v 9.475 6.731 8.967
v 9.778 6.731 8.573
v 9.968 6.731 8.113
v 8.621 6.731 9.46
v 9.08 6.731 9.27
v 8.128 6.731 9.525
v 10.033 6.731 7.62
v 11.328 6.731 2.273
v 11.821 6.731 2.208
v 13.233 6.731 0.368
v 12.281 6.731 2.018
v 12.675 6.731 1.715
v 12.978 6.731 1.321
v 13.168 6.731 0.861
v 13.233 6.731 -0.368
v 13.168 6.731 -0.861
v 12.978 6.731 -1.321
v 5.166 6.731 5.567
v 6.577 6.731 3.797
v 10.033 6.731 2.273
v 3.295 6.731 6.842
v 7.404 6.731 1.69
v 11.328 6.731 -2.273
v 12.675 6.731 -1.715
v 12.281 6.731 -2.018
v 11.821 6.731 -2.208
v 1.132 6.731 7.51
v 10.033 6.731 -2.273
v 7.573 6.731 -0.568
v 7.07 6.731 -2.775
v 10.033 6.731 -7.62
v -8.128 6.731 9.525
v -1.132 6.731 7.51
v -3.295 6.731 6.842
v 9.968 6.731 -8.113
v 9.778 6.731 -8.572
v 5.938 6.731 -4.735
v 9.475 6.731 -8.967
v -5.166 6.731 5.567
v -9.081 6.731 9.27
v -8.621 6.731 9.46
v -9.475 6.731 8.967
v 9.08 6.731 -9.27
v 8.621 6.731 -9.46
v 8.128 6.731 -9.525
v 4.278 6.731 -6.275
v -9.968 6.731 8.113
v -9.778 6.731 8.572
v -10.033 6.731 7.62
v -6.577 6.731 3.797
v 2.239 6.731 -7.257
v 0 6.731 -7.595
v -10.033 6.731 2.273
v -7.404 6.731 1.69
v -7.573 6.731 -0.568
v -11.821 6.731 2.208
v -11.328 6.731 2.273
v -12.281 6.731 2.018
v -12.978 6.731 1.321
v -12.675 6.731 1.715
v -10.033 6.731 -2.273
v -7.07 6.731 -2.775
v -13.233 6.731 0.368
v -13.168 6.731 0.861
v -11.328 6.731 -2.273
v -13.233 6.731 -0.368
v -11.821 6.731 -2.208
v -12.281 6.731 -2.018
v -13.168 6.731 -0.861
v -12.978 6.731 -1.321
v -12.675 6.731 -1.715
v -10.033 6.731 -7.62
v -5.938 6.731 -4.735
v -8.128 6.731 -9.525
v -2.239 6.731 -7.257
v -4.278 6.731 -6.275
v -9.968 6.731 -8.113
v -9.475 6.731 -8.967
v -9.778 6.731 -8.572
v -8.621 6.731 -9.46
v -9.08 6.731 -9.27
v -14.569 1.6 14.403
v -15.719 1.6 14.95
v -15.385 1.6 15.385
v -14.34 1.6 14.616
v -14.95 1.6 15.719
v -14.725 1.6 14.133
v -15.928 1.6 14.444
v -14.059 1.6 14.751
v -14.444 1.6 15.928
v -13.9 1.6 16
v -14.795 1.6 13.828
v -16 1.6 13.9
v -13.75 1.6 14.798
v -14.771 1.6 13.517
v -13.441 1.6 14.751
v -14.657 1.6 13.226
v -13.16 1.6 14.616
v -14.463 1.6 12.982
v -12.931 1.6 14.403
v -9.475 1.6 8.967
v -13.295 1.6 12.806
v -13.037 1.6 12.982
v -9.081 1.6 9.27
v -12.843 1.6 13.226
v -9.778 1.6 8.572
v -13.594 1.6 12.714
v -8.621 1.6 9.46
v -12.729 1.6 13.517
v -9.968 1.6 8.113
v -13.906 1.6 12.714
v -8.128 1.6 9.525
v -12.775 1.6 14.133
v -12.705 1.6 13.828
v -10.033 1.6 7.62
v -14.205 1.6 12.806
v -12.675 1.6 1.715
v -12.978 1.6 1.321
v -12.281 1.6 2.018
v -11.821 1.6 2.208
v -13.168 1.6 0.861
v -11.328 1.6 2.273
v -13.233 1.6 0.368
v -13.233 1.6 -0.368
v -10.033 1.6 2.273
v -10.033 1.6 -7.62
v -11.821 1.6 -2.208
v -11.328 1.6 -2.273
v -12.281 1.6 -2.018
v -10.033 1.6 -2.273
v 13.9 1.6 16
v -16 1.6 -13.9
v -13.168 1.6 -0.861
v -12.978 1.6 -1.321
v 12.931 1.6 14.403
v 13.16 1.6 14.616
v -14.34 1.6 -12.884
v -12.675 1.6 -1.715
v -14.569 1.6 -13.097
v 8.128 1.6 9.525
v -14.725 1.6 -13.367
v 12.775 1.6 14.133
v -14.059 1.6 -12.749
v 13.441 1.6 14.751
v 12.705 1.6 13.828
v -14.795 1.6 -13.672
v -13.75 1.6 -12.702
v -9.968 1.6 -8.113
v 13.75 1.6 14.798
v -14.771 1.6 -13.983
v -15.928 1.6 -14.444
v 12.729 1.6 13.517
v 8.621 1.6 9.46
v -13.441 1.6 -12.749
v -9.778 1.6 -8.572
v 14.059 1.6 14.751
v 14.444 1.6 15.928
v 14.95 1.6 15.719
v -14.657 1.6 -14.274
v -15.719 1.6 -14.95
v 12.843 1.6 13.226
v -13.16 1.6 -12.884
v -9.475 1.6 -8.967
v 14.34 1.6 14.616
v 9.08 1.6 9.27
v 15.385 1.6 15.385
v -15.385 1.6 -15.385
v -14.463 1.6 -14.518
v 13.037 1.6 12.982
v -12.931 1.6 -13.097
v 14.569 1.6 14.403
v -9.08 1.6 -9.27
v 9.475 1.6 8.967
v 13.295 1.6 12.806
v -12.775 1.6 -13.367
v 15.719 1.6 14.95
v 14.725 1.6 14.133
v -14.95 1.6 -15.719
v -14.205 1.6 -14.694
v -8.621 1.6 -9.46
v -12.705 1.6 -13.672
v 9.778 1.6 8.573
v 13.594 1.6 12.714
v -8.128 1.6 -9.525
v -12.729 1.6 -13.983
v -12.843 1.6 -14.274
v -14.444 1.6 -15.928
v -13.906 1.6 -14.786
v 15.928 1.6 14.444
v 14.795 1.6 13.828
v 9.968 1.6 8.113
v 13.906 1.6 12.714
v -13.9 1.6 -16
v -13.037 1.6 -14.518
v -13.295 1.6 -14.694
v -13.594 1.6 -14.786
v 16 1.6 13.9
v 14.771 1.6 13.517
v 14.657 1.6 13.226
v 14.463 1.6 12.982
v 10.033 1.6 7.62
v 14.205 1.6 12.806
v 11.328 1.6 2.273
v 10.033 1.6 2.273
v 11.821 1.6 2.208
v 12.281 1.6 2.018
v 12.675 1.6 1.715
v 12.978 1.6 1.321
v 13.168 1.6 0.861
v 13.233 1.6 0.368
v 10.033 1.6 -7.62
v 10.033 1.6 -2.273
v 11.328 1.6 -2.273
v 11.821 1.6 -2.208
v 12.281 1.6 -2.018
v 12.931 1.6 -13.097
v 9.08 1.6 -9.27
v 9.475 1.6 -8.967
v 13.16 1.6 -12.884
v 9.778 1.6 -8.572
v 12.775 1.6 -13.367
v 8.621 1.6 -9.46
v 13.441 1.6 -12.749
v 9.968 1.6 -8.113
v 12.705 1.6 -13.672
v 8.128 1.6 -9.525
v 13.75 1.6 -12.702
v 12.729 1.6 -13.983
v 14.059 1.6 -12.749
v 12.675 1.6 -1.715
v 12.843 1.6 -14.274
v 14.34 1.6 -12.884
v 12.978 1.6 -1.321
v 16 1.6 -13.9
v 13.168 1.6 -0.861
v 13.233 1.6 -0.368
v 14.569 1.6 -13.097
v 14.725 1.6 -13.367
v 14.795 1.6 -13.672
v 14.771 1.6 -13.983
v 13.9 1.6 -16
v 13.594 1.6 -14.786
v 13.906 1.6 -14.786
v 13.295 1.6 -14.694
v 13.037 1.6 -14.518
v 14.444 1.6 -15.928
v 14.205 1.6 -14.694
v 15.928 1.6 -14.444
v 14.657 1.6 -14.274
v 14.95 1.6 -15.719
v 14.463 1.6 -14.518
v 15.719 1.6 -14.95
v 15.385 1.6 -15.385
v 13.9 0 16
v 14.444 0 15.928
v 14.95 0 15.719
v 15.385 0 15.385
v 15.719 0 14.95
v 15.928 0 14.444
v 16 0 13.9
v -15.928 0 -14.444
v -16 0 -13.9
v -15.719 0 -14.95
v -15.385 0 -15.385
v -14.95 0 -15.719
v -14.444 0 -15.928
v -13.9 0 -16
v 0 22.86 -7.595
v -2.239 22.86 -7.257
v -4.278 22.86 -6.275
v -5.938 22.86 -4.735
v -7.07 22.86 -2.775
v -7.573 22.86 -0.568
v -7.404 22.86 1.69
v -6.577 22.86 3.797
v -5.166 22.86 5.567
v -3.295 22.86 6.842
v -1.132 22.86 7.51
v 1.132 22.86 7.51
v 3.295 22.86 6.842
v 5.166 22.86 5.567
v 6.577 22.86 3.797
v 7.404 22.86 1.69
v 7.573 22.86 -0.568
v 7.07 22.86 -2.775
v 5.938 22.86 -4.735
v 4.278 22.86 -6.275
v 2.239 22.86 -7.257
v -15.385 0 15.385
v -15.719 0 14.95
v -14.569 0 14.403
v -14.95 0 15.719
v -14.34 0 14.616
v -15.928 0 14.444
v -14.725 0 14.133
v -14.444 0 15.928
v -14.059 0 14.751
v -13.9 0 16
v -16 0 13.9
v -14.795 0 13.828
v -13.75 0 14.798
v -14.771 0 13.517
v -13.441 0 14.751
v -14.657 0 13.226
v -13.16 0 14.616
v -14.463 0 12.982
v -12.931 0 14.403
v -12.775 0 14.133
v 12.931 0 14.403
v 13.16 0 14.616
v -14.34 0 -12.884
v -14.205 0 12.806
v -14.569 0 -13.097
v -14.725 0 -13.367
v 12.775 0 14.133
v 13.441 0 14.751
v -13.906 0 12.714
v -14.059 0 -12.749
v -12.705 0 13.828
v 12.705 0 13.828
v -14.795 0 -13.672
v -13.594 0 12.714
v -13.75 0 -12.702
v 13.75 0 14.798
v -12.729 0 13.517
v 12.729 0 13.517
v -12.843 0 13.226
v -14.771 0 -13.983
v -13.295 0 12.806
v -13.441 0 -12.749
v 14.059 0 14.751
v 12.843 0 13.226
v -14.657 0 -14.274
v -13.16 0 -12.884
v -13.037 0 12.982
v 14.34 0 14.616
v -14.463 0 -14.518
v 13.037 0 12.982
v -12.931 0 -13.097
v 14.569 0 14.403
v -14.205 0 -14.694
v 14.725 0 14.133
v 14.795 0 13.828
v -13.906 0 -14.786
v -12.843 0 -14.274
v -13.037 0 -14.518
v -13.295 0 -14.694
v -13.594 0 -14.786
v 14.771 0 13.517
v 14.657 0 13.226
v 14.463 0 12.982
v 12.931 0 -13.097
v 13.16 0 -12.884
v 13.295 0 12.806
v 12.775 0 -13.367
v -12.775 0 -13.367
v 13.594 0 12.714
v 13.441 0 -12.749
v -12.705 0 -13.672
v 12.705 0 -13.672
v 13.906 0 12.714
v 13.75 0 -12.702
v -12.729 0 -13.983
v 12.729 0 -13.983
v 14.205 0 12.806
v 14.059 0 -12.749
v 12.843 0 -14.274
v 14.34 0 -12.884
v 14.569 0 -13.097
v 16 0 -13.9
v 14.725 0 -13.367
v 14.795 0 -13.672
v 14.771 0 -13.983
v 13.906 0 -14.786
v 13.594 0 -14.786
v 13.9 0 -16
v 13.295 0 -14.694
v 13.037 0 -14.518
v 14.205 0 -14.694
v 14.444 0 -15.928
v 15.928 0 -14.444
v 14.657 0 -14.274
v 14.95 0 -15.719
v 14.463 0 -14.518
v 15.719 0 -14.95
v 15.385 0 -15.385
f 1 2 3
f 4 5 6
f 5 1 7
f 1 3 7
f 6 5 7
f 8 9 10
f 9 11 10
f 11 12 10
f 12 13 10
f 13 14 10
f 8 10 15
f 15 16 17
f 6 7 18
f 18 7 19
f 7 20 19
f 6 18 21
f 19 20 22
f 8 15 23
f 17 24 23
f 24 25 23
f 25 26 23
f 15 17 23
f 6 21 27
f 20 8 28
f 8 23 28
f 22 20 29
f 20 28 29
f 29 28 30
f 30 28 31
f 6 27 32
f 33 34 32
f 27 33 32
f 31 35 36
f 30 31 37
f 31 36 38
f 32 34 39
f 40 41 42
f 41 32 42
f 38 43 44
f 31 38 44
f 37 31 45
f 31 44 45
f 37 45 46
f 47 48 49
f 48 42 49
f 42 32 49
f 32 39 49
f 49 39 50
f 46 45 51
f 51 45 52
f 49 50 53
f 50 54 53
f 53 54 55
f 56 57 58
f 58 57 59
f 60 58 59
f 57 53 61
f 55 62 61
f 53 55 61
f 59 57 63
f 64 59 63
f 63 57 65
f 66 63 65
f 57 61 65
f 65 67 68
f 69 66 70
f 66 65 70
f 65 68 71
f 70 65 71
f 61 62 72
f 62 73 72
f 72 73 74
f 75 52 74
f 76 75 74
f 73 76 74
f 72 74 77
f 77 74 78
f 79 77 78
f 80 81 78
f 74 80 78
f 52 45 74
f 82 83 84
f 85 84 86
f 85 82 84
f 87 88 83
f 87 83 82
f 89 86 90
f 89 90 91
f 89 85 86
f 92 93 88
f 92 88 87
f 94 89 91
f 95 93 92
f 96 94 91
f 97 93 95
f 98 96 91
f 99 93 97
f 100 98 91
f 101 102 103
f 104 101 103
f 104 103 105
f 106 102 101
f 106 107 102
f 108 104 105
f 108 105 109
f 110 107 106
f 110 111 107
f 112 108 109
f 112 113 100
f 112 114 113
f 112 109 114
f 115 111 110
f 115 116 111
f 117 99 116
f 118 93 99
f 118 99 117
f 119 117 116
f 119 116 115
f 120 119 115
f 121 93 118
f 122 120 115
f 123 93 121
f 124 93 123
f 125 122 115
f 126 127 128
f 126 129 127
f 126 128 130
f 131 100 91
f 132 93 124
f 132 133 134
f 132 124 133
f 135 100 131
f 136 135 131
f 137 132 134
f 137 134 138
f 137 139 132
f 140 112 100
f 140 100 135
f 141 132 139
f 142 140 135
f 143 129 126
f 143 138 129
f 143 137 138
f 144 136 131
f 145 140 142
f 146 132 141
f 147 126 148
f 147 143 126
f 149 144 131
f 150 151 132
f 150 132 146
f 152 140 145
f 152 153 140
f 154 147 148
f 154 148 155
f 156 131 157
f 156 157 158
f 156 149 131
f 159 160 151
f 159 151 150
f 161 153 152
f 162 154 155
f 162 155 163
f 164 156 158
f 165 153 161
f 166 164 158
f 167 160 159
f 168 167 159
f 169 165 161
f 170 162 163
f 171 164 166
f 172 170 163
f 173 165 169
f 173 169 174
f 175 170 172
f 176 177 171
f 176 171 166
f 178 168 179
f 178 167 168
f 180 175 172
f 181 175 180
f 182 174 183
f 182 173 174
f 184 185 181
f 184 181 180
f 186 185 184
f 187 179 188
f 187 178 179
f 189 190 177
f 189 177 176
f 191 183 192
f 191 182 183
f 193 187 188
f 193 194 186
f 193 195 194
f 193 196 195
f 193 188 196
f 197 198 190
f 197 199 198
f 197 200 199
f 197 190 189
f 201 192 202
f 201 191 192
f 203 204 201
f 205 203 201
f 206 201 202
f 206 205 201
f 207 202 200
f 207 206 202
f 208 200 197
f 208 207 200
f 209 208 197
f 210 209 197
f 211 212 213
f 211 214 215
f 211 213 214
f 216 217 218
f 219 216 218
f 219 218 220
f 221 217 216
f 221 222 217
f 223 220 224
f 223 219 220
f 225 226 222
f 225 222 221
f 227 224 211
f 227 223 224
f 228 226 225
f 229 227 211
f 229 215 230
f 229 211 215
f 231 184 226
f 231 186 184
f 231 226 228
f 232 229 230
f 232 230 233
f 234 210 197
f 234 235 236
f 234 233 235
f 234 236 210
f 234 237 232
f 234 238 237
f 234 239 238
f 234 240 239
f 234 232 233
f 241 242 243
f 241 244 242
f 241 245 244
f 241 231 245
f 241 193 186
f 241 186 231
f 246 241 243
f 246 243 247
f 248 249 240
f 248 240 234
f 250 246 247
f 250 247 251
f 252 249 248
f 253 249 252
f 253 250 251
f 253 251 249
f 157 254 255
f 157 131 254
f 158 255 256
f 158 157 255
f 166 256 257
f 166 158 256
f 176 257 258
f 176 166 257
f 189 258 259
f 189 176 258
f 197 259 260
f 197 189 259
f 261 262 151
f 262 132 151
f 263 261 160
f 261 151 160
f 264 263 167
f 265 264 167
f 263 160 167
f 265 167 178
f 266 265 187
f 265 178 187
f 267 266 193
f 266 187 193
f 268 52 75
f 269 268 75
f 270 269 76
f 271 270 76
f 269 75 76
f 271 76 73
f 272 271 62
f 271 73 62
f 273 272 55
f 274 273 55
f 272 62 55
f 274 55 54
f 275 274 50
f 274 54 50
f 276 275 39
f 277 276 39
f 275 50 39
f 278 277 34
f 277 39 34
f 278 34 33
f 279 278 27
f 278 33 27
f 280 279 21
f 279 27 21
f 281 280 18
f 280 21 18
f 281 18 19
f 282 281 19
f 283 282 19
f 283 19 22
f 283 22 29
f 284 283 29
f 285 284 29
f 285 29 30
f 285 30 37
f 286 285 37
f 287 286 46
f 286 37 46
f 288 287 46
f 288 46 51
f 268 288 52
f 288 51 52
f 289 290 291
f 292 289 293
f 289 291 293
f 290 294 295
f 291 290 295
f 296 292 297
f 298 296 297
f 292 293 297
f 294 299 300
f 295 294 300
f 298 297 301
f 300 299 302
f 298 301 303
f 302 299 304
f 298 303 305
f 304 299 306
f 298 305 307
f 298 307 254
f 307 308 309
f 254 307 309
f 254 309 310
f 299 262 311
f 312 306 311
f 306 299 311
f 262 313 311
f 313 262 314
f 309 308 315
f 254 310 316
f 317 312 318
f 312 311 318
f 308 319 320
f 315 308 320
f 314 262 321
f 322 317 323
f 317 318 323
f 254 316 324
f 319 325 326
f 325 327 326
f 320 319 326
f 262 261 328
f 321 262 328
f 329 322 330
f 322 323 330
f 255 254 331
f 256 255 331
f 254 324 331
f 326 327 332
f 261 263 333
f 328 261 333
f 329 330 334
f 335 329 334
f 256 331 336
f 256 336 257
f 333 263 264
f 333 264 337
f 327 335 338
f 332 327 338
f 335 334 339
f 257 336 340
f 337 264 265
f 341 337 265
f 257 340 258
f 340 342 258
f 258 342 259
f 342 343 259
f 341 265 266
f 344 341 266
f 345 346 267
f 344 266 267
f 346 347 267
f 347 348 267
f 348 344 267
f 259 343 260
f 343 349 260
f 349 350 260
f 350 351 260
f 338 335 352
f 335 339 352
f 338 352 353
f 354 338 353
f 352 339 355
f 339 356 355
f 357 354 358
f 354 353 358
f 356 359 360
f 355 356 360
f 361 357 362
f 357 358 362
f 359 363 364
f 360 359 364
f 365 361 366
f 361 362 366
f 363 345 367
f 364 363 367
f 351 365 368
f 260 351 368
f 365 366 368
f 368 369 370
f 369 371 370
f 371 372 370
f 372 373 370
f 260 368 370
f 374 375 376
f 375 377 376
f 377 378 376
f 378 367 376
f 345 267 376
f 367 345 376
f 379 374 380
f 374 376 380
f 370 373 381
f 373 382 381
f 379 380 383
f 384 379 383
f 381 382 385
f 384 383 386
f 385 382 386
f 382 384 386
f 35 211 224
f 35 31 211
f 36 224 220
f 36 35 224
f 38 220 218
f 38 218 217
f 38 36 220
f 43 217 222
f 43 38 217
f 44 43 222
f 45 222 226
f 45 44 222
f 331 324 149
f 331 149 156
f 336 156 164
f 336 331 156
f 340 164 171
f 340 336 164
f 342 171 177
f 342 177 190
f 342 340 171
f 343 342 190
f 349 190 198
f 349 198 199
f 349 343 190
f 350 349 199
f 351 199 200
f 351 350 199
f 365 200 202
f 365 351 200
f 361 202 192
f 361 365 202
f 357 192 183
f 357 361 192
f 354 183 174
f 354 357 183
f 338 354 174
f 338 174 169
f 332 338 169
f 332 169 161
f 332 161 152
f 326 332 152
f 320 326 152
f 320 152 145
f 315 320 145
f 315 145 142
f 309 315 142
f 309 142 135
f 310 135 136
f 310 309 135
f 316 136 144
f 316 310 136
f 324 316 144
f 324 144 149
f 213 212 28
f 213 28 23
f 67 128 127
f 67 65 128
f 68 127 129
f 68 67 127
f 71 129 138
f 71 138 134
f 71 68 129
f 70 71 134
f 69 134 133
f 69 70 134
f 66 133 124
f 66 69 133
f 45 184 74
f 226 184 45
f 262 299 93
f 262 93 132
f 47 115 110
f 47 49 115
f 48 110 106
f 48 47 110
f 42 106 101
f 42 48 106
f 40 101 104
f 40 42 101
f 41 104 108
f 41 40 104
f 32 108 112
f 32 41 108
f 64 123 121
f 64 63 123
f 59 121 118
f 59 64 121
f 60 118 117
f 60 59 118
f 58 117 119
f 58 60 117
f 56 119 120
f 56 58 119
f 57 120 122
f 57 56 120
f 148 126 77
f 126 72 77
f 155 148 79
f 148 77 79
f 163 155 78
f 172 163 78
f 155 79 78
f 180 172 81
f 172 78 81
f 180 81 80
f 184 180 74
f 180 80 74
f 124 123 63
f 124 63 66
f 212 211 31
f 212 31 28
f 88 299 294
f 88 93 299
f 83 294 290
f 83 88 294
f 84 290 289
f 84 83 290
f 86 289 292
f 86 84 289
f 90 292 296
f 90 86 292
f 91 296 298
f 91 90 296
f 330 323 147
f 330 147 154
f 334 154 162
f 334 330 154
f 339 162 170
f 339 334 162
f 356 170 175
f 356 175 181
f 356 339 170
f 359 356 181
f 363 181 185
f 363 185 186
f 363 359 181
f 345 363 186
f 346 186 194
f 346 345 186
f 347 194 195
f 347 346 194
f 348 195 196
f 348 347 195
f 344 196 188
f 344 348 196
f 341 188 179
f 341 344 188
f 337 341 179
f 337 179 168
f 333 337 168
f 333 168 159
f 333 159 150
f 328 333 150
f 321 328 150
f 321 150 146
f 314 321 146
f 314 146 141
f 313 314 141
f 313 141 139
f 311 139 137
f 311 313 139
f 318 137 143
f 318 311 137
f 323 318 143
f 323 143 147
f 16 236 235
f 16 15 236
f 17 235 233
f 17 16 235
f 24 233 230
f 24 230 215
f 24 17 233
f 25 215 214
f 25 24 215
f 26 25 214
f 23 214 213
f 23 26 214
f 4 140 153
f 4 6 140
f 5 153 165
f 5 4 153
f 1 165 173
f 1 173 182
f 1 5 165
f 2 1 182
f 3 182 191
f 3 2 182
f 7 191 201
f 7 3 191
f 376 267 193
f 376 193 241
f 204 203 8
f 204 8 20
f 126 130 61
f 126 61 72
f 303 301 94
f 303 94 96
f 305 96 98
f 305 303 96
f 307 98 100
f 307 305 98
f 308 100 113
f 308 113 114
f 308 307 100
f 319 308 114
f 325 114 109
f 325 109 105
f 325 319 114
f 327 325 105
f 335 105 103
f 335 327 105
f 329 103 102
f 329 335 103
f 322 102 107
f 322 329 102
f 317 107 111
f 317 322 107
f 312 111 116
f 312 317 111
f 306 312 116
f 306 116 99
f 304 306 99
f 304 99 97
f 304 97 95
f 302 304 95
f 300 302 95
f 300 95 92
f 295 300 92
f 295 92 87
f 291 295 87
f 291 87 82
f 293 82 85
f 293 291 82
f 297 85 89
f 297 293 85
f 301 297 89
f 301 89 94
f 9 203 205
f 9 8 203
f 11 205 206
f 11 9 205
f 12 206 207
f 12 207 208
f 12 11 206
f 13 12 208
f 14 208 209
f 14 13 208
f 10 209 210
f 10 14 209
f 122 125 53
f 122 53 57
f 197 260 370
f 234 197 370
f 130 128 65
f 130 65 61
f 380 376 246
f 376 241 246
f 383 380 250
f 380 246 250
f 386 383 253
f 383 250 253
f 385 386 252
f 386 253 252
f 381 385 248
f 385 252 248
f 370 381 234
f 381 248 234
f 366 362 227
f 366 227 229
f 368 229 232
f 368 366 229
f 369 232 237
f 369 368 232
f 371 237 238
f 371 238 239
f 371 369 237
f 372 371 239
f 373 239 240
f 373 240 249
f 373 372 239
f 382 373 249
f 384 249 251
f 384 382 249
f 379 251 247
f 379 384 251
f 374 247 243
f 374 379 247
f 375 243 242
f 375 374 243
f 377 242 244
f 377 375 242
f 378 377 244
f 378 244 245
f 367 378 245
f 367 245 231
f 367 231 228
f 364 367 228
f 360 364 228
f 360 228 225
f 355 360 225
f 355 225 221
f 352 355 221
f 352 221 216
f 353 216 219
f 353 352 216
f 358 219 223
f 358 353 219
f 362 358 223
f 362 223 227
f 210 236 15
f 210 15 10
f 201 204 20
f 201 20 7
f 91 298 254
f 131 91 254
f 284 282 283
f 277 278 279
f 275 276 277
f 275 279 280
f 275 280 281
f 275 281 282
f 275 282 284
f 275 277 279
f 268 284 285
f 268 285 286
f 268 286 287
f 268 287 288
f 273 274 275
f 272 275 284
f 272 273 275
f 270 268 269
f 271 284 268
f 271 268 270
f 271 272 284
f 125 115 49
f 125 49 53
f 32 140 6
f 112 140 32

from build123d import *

# Parameters (mm, degrees)
SKETCH1_W           = 32
SKETCH1_H           = 32
SKETCH1_R           = 1.04775
BOSS_EXTRUDE1_DEPTH = 1.6002
BOSS_EXTRUDE2_DEPTH = 5.1308
FILLET1_R           = 2.1
FILLET2_R           = 1.905
SKETCH3_R           = 7.5946
BOSS_EXTRUDE3_DEPTH = 16.129


with BuildPart() as part:
    # Sketch1 → Boss-Extrude1 (new body)
    with BuildSketch(Plane(origin=(0, 0, 0), x_dir=(1, 0, 0), z_dir=(0, 1, 0))):
        Rectangle(SKETCH1_W, SKETCH1_H)
        with Locations(Location((13.7500106, 13.7500106, 0), (0, 0, 270))):
            Circle(SKETCH1_R, mode=Mode.SUBTRACT)
        with Locations(Location((-13.7500106, 13.7500106, 0), (0, 0, 270))):
            Circle(SKETCH1_R, mode=Mode.SUBTRACT)
        with Locations(Location((-13.75, -13.7500106, 0), (0, 0, 270))):
            Circle(SKETCH1_R, mode=Mode.SUBTRACT)
        with Locations(Location((13.7500106, -13.7500106, 0), (0, 0, 270))):
            Circle(SKETCH1_R, mode=Mode.SUBTRACT)
    extrude(amount=BOSS_EXTRUDE1_DEPTH)

    # Sketch2 → Boss-Extrude2 (add)
    with BuildSketch(Plane(origin=(0, 1.6002, 0), x_dir=(1, 0, 0), z_dir=(0, 1, 0))):
        Polygon((-10.033, 9.525), (10.033, 9.525), (10.033, 2.2733), (13.2334, 2.2733), (13.2334, -2.2733), (10.033, -2.2733), (10.033, -9.525), (-10.033, -9.525), (-10.033, -2.2733), (-13.2334, -2.2733), (-13.2334, 2.2733), (-10.033, 2.2733), align=None)
    extrude(amount=BOSS_EXTRUDE2_DEPTH)

    # Fillet1
    fillet1_edges = [part.edges().sort_by_distance(p)[0] for p in [
        (-16, 0.8001, -16),
        (16, 0.8001, -16),
        (16, 0.8001, 16),
        (-16, 0.8001, 16),
    ]]
    fillet(fillet1_edges, radius=FILLET1_R)

    # Fillet2
    fillet2_edges = [part.edges().sort_by_distance(p)[0] for p in [
        (-10.033, 4.1656, -9.525),
        (-13.2334, 4.1656, -2.2733),
        (-13.2334, 4.1656, 2.2733),
        (-10.033, 4.1656, 9.525),
        (10.033, 4.1656, 9.525),
        (13.2334, 4.1656, 2.2733),
        (13.2334, 4.1656, -2.2733),
        (10.033, 4.1656, -9.525),
    ]]
    fillet(fillet2_edges, radius=FILLET2_R)

    # Sketch3 → Boss-Extrude3 (add)
    with BuildSketch(Plane(origin=(0, 6.731, 0), x_dir=(1, 0, 0), z_dir=(0, 1, 0))):
        with Locations(Location((0, 0, 0), (0, 0, 90))):
            Circle(SKETCH3_R)
    extrude(amount=BOSS_EXTRUDE3_DEPTH)


solid = part.part
